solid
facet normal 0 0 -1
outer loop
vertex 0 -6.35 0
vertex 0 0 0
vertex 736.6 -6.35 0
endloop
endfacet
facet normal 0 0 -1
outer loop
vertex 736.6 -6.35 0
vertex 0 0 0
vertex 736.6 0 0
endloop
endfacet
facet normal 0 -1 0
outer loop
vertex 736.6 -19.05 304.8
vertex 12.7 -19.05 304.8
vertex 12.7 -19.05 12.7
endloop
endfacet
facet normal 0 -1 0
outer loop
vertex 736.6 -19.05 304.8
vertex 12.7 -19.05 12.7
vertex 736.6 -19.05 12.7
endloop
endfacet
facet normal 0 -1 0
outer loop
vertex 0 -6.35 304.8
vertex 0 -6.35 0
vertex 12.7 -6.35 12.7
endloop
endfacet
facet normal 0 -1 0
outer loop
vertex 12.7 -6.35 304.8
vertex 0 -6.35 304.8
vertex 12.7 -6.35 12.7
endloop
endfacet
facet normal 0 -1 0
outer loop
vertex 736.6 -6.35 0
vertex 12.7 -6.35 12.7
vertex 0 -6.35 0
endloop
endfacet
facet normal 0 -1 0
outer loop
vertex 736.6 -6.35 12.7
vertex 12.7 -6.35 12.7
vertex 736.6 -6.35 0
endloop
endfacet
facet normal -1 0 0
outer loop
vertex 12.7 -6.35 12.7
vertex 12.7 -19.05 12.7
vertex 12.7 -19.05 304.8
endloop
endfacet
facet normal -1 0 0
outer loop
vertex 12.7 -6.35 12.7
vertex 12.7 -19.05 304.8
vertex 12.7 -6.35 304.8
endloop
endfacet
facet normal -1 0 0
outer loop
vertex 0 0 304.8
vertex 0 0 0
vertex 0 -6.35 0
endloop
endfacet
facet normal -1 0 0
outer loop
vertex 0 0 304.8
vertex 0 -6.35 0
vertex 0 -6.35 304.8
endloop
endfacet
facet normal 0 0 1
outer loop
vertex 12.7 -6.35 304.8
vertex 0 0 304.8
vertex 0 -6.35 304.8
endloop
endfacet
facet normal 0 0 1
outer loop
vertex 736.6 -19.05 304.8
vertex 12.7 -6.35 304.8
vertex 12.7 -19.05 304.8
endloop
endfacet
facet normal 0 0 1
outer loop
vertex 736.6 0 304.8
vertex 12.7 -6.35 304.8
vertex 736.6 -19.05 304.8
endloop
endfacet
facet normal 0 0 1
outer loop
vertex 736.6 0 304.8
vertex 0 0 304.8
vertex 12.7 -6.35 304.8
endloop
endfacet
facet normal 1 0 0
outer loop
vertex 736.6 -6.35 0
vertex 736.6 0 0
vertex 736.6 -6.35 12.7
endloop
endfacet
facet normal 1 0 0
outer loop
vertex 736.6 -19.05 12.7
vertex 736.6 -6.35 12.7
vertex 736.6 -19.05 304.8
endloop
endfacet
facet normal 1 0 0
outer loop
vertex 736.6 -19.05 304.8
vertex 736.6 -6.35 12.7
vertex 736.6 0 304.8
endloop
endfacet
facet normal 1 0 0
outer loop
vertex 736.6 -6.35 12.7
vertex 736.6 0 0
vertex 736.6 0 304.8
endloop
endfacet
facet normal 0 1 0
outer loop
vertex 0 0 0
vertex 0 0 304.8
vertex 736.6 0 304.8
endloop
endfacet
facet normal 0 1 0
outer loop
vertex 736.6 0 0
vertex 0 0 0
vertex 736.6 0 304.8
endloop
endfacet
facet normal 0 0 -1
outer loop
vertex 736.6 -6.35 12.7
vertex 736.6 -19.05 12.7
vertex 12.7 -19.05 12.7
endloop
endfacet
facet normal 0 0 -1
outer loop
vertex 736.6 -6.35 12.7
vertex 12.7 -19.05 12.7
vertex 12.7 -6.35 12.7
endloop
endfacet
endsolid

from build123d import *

# Parameters (mm, degrees)
F0_W     = 736.6
F0_H     = 304.8
F1_DEPTH = 19.05
F2_W     = 12.7
F2_H     = 12.7
F3_DEPTH = 736.601
F4_W     = 12.7
F4_H     = 12.7
F5_DEPTH = 304.801


with BuildPart() as f1:
    # F0 (on Front) → F1 (new body)
    with BuildSketch(Plane.XZ):
        with Locations((368.3, 152.4)):
            Rectangle(F0_W, F0_H)
    extrude(amount=F1_DEPTH)

    # F2 (on face) → F3 (cut, through all)
    with BuildSketch(Plane.YZ.offset(736.6)):
        with Locations((-12.7, 6.35)):
            Rectangle(F2_W, F2_H)
    extrude(amount=-F3_DEPTH, mode=Mode.SUBTRACT)

    # F4 (on face) → F5 (cut, through all)
    with BuildSketch(Plane.XY.offset(304.8)):
        with Locations((6.35, -12.7)):
            Rectangle(F4_W, F4_H)
    extrude(amount=-F5_DEPTH, mode=Mode.SUBTRACT)


solid = f1.part
